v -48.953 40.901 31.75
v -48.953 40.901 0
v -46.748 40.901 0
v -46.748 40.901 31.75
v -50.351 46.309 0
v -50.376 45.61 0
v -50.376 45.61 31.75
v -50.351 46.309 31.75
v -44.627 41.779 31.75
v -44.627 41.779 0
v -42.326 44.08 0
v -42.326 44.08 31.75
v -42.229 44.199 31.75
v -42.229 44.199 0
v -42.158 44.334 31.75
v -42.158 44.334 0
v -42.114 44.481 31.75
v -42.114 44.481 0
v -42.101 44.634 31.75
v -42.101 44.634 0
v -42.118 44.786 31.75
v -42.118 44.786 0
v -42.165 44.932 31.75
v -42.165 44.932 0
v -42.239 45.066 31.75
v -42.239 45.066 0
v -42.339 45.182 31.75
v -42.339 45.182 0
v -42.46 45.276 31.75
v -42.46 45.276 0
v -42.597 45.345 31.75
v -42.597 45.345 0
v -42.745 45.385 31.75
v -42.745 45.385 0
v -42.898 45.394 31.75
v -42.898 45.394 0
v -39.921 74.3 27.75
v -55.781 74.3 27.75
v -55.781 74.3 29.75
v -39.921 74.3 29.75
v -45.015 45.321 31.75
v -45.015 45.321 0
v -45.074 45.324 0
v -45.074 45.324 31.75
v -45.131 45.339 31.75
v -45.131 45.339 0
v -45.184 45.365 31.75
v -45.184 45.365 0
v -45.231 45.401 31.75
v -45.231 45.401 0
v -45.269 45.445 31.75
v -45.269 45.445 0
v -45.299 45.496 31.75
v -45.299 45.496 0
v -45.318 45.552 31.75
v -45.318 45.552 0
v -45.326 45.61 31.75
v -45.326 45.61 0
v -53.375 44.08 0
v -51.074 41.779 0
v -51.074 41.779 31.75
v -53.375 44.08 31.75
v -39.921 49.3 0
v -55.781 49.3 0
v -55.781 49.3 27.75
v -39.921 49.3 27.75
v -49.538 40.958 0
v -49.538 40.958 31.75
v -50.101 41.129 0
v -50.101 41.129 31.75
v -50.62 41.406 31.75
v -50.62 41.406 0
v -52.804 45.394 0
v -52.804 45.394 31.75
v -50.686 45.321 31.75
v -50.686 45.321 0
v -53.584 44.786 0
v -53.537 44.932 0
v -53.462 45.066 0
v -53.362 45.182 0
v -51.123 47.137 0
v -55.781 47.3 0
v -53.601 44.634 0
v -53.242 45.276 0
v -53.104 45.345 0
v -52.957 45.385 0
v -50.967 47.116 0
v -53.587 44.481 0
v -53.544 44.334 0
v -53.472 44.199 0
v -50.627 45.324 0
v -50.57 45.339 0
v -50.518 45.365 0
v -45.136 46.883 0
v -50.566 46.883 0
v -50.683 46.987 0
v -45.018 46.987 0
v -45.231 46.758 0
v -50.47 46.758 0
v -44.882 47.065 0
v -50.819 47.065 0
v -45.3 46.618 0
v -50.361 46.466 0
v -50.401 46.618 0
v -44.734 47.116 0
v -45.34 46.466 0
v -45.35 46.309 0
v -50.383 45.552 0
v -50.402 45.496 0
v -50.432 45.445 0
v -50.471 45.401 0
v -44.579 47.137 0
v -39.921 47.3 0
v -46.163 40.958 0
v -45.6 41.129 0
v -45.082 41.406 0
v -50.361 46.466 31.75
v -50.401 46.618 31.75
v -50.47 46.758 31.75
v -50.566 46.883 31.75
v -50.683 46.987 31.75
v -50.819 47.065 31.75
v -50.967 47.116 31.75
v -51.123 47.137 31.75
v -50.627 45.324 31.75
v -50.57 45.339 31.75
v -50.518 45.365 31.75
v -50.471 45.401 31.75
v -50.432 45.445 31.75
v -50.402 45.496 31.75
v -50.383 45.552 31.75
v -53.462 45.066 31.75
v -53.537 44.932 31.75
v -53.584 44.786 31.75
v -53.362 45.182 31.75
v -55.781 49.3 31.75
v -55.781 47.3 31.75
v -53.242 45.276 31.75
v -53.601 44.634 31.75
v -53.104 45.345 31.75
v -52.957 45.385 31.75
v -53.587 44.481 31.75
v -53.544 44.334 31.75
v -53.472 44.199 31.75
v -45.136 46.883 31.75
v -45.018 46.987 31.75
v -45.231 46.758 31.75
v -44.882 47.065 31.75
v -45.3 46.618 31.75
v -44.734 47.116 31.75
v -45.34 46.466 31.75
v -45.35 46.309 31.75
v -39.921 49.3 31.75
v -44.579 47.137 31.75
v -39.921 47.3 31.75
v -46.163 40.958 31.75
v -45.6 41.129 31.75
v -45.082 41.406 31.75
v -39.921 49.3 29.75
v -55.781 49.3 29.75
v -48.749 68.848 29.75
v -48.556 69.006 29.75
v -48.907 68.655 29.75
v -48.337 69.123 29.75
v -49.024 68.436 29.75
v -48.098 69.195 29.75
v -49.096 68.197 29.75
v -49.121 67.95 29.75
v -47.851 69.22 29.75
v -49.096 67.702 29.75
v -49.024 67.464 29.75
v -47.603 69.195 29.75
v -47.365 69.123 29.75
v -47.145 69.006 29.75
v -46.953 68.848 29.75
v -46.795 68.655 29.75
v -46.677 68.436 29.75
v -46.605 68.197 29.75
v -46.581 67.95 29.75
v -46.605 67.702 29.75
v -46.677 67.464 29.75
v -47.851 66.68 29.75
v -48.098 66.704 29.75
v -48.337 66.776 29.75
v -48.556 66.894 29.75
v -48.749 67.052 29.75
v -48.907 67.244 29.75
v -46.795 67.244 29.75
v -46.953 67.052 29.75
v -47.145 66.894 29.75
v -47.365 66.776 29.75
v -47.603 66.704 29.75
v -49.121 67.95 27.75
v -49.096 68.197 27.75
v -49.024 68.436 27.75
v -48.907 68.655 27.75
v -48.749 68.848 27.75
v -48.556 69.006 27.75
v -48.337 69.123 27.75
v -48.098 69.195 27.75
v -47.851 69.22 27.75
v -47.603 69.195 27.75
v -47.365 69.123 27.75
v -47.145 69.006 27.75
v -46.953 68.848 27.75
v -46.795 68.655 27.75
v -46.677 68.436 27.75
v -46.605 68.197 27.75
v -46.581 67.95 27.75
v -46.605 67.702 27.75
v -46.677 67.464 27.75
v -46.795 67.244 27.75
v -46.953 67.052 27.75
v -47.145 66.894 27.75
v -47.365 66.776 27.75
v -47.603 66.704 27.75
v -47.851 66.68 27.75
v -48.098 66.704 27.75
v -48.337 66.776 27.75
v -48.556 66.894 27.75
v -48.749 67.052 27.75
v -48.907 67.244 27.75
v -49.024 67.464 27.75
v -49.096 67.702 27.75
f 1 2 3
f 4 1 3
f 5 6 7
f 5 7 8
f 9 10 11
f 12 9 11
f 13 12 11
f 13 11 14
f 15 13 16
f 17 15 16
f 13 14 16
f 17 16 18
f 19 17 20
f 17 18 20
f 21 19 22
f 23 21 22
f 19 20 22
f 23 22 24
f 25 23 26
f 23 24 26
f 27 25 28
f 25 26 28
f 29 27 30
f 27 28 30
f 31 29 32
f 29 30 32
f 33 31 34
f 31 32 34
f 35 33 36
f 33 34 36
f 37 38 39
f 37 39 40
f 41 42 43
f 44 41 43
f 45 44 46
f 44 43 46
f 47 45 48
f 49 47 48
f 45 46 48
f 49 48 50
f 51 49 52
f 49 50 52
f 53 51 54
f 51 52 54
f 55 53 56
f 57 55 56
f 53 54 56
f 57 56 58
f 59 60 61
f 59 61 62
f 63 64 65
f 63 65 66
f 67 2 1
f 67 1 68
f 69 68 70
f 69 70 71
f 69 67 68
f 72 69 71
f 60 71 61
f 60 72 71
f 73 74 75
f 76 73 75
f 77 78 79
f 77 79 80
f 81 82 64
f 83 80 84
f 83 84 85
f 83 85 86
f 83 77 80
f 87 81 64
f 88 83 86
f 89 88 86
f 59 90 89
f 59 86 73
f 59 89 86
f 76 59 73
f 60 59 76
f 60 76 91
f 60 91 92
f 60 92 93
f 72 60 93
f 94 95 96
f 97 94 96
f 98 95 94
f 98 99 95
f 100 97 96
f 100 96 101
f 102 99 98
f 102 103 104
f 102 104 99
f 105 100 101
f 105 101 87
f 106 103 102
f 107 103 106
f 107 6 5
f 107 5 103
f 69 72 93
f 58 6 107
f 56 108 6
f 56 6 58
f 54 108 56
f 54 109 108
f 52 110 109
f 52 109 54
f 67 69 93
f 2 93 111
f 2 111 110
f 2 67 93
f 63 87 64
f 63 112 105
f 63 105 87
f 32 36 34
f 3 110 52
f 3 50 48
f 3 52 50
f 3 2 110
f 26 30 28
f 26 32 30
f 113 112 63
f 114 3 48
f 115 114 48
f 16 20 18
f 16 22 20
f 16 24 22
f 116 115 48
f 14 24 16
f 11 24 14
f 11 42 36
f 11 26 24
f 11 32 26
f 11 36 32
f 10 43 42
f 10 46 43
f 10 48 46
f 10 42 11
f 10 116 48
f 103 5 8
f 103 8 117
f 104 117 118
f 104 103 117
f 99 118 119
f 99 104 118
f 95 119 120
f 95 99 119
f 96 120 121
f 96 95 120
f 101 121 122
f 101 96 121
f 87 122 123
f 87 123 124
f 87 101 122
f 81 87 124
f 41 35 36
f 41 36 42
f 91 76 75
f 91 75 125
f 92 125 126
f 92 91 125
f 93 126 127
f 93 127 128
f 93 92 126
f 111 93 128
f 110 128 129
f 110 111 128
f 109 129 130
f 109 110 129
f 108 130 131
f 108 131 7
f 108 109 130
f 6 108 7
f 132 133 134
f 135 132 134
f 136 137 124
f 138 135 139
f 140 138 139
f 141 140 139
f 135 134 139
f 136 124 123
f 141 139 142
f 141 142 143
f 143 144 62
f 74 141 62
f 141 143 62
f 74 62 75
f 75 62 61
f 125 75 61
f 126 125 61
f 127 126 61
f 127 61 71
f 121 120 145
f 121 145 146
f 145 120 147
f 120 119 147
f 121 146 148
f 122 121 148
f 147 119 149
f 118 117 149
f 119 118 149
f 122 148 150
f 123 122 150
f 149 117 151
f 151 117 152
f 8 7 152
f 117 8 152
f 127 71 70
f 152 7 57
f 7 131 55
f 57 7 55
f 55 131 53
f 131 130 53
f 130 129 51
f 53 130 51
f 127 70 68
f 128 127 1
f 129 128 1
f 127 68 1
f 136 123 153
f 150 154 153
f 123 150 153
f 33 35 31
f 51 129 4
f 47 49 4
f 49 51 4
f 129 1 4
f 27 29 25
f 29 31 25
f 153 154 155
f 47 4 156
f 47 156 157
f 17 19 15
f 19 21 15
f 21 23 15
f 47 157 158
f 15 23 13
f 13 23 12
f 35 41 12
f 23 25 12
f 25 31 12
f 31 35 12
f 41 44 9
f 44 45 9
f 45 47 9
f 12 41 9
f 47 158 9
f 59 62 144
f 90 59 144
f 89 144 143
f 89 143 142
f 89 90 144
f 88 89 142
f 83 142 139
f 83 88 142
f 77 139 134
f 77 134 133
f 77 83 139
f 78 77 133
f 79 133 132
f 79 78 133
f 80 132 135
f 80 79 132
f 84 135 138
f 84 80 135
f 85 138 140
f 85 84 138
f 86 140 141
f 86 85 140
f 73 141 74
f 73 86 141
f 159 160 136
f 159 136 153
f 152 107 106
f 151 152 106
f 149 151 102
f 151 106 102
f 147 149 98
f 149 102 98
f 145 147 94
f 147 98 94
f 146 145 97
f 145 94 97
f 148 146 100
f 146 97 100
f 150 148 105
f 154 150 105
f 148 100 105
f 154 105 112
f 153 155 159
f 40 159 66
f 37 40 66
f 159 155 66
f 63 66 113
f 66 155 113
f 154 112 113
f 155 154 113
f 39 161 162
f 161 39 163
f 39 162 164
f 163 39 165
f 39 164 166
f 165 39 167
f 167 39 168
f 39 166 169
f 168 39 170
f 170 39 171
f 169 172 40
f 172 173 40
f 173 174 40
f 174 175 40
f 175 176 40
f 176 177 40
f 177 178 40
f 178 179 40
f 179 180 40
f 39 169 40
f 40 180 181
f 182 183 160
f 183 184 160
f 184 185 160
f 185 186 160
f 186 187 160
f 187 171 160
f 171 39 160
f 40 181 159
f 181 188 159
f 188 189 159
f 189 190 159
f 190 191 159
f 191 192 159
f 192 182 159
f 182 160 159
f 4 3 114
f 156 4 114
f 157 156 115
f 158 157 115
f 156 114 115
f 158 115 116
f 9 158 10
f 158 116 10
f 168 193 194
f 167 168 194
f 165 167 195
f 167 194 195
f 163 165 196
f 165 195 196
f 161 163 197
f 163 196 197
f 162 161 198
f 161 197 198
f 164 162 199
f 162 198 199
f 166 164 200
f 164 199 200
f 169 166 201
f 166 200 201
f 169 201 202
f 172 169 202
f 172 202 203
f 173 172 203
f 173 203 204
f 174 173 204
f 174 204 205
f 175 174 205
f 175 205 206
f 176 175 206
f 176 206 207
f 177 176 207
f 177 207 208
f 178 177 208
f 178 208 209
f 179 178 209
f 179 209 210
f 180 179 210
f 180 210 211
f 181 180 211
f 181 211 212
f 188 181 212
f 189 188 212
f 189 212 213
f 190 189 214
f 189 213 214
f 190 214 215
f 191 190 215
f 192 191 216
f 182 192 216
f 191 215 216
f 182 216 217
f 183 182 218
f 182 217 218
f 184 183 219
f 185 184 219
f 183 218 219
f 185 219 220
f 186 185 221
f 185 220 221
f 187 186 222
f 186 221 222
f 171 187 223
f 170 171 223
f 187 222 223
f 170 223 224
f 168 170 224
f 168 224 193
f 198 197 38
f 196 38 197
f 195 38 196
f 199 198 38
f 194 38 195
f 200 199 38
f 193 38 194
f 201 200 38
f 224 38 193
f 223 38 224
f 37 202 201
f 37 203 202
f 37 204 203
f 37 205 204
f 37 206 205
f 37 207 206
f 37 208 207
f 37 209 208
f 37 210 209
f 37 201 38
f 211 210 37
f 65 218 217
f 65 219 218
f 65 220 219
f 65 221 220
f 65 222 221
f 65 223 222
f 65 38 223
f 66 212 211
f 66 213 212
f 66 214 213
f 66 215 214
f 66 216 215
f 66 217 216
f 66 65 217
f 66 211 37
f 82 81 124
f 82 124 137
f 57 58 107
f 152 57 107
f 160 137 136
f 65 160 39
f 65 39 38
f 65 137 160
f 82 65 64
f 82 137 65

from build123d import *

# Parameters (mm, degrees)
BOSS_EXTRUDE1_DEPTH = 31.75
SKETCH19_W          = 15.860402013
SKETCH19_H          = 31.75
BOSS_EXTRUDE7_DEPTH = 2
SKETCH23_W          = 15.860402013
SKETCH23_H          = 2
BOSS_EXTRUDE8_DEPTH = 25
SKETCH24_R          = 1.27
CUT_EXTRUDE1_DEPTH  = 2.54


with BuildPart() as part:
    # Sketch2 → Boss-Extrude1 (new body)
    with BuildSketch(Plane.XY):
        with BuildLine():
            Line((-50.375618534, 45.609862895), (-50.351188886, 46.309436474))
            ThreePointArc((-50.351188886, 46.309436474), (-50.565618587, 46.88295476), (-51.12278195, 47.136868733))
            Line((-51.12278195, 47.136868733), (-55.780902554, 47.299533889))
            Line((-55.780902554, 47.299533889), (-47.850701548, 47.299533889))
            Line((-47.850701548, 47.299533889), (-47.850701548, 40.900752235))
            Line((-47.850701548, 40.900752235), (-48.952946324, 40.900752235))
            ThreePointArc((-48.952946324, 40.900752235), (-50.100996621, 41.129113637), (-51.074266668, 41.779431891))
            Line((-51.074266668, 41.779431891), (-53.375146928, 44.080312152))
            ThreePointArc((-53.375146928, 44.080312152), (-53.536830204, 44.931922499), (-52.803734096, 45.394471696))
            Line((-52.803734096, 45.394471696), (-50.685905631, 45.320515496))
            ThreePointArc((-50.685905631, 45.320515496), (-50.470836274, 45.400926634), (-50.375618534, 45.609862895))
        make_face()
    boss_extrude1 = extrude(amount=BOSS_EXTRUDE1_DEPTH)

    # Mirror2: Boss-Extrude1 across plane
    add(boss_extrude1.mirror(Plane(origin=(-47.850701548, 40.900752235, 31.75), x_dir=(0, 0, 1), z_dir=(-1, 0, 0))))

    # Sketch19 → Boss-Extrude7 (add)
    with BuildSketch(Plane(origin=(0, 47.299533889, 0), x_dir=(1, 0, 0), z_dir=(0, 1, 0))):
        with Locations((-47.850701548, -15.875)):
            Rectangle(SKETCH19_W, SKETCH19_H)
    extrude(amount=BOSS_EXTRUDE7_DEPTH)

    # Sketch23 → Boss-Extrude8 (add)
    with BuildSketch(Plane(origin=(0, 49.299533889, 0), x_dir=(1, 0, 0), z_dir=(0, 1, 0))):
        with Locations((-47.850701548, -28.75)):
            Rectangle(SKETCH23_W, SKETCH23_H)
    extrude(amount=BOSS_EXTRUDE8_DEPTH)

    # Sketch24 → Cut-Extrude1 (cut)
    with BuildSketch(Plane(origin=(0, 0, 27.75), x_dir=(-1, 0, 0), z_dir=(0, 0, -1))):
        with Locations((47.850701548, 67.949533889)):
            Circle(SKETCH24_R)
    extrude(amount=-CUT_EXTRUDE1_DEPTH, mode=Mode.SUBTRACT)


solid = part.part
